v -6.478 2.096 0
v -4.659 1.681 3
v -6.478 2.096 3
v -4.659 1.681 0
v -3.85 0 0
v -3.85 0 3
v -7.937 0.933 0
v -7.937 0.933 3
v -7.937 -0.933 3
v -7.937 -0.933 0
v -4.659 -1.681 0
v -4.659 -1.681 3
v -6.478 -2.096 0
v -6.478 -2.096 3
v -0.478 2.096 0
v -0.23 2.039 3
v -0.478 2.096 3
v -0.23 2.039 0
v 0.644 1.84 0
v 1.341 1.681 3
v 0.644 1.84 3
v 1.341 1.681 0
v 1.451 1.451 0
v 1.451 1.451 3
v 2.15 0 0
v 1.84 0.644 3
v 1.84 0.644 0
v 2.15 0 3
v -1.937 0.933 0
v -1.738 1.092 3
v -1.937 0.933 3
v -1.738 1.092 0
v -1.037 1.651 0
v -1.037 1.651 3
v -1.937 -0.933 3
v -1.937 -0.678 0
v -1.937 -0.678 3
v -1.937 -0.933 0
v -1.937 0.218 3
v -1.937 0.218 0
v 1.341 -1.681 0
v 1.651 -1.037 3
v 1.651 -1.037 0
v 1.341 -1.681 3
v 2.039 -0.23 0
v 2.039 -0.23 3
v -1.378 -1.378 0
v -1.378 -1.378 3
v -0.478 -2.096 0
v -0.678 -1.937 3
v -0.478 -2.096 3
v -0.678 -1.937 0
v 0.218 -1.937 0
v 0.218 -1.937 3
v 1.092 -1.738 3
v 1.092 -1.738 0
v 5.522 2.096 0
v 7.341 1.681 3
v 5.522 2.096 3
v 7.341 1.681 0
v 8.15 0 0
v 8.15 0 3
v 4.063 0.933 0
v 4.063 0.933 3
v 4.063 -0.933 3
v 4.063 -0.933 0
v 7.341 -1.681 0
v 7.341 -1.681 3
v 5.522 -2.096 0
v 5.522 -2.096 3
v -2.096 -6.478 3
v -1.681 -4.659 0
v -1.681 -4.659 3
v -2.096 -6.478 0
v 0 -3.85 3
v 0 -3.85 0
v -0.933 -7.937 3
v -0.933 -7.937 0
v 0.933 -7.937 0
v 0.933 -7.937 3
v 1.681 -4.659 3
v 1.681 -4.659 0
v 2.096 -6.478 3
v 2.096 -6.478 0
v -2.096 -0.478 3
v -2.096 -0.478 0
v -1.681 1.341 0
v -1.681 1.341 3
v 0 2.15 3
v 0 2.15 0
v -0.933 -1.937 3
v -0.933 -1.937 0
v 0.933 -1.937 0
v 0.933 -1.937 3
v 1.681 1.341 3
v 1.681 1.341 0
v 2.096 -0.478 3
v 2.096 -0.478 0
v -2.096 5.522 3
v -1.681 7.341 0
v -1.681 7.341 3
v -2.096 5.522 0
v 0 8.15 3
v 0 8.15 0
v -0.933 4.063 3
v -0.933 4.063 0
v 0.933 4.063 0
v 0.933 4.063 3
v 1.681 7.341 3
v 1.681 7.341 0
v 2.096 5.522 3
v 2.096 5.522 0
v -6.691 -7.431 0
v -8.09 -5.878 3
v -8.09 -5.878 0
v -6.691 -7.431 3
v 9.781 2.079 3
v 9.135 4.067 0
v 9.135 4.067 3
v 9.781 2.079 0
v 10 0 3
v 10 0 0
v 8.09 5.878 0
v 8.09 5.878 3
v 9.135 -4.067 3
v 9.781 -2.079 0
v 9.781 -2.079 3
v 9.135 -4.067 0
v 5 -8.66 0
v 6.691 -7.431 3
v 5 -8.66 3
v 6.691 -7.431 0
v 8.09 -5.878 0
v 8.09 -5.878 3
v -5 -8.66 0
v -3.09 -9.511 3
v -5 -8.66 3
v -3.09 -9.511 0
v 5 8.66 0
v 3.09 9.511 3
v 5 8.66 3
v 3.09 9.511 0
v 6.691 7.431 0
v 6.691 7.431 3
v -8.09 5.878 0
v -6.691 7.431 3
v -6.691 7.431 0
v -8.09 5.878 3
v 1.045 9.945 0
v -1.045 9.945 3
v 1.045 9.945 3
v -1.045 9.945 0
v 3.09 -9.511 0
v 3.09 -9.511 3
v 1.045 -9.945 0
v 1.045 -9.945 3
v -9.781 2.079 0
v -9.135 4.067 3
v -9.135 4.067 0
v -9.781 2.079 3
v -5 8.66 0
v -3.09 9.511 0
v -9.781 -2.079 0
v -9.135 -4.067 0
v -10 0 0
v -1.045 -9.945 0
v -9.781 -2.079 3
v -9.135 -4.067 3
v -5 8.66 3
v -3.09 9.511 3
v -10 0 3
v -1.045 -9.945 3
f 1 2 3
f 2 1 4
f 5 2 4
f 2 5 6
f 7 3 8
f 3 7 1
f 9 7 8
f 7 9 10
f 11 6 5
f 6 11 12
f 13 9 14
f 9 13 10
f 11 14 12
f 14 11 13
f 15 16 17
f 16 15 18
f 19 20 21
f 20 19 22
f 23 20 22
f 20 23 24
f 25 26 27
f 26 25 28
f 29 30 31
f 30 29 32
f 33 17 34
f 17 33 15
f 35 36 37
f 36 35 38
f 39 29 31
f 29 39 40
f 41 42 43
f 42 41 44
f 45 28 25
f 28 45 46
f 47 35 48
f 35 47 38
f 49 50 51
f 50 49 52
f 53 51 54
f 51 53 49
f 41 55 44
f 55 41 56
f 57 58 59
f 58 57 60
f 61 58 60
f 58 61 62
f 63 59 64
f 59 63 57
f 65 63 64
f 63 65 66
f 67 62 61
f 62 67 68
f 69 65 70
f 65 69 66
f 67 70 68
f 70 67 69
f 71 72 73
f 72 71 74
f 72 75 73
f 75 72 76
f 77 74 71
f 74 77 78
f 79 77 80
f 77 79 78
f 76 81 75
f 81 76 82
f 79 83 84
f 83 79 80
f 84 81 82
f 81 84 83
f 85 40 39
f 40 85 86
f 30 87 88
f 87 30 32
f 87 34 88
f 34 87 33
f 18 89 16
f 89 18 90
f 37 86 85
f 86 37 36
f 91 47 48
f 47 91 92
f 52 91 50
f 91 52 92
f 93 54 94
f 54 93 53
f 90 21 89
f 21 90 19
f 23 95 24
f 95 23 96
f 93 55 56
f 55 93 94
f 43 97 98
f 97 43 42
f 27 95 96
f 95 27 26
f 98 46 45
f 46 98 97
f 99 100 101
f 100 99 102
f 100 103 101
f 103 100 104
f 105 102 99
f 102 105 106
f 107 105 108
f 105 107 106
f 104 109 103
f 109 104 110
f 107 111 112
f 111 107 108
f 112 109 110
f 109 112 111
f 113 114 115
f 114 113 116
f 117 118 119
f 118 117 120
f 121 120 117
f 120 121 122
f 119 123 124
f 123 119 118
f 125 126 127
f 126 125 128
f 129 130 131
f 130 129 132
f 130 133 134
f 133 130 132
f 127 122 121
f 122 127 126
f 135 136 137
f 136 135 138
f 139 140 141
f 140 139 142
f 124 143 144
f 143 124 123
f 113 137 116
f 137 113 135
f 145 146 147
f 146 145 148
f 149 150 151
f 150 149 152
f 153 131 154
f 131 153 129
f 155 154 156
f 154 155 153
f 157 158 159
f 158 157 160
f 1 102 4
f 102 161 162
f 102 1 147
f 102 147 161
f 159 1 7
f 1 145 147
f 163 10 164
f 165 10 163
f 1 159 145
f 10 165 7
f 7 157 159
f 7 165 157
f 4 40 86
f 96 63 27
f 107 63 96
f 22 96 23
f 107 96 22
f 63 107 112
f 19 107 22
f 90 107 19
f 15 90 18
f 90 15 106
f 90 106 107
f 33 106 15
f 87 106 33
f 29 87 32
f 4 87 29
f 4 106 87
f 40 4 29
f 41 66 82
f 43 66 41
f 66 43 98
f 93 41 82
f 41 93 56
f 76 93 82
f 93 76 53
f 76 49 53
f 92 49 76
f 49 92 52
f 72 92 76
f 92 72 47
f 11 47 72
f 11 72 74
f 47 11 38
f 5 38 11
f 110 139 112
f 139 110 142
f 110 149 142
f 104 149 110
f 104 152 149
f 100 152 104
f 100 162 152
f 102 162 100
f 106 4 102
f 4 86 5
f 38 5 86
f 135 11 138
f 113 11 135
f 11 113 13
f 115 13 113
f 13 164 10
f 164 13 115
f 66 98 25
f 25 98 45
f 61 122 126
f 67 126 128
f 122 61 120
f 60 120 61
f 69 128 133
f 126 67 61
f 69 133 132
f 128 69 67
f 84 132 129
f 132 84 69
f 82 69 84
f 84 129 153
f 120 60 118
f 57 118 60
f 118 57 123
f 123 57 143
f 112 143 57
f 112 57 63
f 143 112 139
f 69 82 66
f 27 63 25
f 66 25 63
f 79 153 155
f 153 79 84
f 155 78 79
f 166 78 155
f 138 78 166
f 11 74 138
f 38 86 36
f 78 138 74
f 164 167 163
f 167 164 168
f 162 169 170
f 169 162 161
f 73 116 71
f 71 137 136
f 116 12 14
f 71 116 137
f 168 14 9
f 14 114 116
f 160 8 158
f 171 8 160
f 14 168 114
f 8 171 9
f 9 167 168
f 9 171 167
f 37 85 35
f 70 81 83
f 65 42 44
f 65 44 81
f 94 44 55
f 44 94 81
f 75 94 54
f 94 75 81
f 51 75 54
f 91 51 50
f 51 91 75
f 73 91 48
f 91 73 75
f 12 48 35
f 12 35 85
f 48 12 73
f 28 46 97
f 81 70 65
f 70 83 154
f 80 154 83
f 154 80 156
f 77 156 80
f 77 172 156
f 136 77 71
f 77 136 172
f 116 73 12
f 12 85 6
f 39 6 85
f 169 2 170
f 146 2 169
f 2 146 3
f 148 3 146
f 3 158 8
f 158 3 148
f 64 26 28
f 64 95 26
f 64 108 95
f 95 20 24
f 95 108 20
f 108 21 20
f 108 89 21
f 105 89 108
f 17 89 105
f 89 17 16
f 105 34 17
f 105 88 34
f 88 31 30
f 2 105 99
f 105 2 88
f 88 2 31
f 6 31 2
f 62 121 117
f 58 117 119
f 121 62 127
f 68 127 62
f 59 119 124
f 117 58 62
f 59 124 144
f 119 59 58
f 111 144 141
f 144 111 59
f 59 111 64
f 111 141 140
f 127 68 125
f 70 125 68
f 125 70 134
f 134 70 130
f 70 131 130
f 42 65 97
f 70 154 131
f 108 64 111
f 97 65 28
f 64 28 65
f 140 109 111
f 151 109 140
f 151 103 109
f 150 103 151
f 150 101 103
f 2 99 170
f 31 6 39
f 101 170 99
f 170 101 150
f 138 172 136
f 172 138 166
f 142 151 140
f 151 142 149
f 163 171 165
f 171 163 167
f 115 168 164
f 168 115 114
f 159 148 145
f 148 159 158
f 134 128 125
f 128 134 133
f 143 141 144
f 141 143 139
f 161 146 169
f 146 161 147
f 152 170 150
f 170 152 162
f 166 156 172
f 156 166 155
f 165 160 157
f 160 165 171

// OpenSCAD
// file: ollo.scad
Collisions=false;

// Diameter of plastic ollo holes
OlloHoles = 4.3;

// Width of Ollo "real" plastic
OlloWidth = 3;

// Distance between two ollo holes
OlloSpacing = 6;

// Do an Ollo hole on the part
module olloHole(depth=2.2)
{
    if (!Collisions) {
        //:BOM "Ollo rivet" 0.05 http://www.robotis-shop-en.com/?act=shop_en.goods_view&GS=1605
        translate([0,0,-0.1])
            cylinder(depth+0.2, OlloHoles/2, OlloHoles/2);
    }	    
}

// Do 3 ollo holes
module threeOllo(depth=2.2)
{
    for (xy=[[-OlloSpacing,0],[0,0],[OlloSpacing,0]]) {
        translate([xy[0], xy[1], 0])
            olloHole(depth);
    }
}

// Do a servo arm holes
module servoArm(depth=2.2)
{
    threeOllo(depth);
    rotate([0,0,90])
        threeOllo(depth);
}
// main file
Collisions=false;
include <ollo.scad>;

module arm_pulley(pulley=false)
{
	c = pulley?[0.6,0.6,0.6]:[0.2,0.2,0.2];
    if (!Collisions) {
	    color(c) {
		difference() {
		    cylinder(d=20, h=OlloWidth);
		    servoArm(OlloWidth);
		}
	    }
    }
}

//:Model "Arm" [0.1,0.1,0.1]
module arm(pulley=false) {
    arm_pulley();
}

//:Model "Pulley" [0.6,0.6,0.6]
module pulley() {
    //:BOM "Ollo pulley" 0.2 http://www.robotis-shop-en.com/?act=shop_en.goods_view&GS=1590
    arm_pulley(true);
}

arm();
